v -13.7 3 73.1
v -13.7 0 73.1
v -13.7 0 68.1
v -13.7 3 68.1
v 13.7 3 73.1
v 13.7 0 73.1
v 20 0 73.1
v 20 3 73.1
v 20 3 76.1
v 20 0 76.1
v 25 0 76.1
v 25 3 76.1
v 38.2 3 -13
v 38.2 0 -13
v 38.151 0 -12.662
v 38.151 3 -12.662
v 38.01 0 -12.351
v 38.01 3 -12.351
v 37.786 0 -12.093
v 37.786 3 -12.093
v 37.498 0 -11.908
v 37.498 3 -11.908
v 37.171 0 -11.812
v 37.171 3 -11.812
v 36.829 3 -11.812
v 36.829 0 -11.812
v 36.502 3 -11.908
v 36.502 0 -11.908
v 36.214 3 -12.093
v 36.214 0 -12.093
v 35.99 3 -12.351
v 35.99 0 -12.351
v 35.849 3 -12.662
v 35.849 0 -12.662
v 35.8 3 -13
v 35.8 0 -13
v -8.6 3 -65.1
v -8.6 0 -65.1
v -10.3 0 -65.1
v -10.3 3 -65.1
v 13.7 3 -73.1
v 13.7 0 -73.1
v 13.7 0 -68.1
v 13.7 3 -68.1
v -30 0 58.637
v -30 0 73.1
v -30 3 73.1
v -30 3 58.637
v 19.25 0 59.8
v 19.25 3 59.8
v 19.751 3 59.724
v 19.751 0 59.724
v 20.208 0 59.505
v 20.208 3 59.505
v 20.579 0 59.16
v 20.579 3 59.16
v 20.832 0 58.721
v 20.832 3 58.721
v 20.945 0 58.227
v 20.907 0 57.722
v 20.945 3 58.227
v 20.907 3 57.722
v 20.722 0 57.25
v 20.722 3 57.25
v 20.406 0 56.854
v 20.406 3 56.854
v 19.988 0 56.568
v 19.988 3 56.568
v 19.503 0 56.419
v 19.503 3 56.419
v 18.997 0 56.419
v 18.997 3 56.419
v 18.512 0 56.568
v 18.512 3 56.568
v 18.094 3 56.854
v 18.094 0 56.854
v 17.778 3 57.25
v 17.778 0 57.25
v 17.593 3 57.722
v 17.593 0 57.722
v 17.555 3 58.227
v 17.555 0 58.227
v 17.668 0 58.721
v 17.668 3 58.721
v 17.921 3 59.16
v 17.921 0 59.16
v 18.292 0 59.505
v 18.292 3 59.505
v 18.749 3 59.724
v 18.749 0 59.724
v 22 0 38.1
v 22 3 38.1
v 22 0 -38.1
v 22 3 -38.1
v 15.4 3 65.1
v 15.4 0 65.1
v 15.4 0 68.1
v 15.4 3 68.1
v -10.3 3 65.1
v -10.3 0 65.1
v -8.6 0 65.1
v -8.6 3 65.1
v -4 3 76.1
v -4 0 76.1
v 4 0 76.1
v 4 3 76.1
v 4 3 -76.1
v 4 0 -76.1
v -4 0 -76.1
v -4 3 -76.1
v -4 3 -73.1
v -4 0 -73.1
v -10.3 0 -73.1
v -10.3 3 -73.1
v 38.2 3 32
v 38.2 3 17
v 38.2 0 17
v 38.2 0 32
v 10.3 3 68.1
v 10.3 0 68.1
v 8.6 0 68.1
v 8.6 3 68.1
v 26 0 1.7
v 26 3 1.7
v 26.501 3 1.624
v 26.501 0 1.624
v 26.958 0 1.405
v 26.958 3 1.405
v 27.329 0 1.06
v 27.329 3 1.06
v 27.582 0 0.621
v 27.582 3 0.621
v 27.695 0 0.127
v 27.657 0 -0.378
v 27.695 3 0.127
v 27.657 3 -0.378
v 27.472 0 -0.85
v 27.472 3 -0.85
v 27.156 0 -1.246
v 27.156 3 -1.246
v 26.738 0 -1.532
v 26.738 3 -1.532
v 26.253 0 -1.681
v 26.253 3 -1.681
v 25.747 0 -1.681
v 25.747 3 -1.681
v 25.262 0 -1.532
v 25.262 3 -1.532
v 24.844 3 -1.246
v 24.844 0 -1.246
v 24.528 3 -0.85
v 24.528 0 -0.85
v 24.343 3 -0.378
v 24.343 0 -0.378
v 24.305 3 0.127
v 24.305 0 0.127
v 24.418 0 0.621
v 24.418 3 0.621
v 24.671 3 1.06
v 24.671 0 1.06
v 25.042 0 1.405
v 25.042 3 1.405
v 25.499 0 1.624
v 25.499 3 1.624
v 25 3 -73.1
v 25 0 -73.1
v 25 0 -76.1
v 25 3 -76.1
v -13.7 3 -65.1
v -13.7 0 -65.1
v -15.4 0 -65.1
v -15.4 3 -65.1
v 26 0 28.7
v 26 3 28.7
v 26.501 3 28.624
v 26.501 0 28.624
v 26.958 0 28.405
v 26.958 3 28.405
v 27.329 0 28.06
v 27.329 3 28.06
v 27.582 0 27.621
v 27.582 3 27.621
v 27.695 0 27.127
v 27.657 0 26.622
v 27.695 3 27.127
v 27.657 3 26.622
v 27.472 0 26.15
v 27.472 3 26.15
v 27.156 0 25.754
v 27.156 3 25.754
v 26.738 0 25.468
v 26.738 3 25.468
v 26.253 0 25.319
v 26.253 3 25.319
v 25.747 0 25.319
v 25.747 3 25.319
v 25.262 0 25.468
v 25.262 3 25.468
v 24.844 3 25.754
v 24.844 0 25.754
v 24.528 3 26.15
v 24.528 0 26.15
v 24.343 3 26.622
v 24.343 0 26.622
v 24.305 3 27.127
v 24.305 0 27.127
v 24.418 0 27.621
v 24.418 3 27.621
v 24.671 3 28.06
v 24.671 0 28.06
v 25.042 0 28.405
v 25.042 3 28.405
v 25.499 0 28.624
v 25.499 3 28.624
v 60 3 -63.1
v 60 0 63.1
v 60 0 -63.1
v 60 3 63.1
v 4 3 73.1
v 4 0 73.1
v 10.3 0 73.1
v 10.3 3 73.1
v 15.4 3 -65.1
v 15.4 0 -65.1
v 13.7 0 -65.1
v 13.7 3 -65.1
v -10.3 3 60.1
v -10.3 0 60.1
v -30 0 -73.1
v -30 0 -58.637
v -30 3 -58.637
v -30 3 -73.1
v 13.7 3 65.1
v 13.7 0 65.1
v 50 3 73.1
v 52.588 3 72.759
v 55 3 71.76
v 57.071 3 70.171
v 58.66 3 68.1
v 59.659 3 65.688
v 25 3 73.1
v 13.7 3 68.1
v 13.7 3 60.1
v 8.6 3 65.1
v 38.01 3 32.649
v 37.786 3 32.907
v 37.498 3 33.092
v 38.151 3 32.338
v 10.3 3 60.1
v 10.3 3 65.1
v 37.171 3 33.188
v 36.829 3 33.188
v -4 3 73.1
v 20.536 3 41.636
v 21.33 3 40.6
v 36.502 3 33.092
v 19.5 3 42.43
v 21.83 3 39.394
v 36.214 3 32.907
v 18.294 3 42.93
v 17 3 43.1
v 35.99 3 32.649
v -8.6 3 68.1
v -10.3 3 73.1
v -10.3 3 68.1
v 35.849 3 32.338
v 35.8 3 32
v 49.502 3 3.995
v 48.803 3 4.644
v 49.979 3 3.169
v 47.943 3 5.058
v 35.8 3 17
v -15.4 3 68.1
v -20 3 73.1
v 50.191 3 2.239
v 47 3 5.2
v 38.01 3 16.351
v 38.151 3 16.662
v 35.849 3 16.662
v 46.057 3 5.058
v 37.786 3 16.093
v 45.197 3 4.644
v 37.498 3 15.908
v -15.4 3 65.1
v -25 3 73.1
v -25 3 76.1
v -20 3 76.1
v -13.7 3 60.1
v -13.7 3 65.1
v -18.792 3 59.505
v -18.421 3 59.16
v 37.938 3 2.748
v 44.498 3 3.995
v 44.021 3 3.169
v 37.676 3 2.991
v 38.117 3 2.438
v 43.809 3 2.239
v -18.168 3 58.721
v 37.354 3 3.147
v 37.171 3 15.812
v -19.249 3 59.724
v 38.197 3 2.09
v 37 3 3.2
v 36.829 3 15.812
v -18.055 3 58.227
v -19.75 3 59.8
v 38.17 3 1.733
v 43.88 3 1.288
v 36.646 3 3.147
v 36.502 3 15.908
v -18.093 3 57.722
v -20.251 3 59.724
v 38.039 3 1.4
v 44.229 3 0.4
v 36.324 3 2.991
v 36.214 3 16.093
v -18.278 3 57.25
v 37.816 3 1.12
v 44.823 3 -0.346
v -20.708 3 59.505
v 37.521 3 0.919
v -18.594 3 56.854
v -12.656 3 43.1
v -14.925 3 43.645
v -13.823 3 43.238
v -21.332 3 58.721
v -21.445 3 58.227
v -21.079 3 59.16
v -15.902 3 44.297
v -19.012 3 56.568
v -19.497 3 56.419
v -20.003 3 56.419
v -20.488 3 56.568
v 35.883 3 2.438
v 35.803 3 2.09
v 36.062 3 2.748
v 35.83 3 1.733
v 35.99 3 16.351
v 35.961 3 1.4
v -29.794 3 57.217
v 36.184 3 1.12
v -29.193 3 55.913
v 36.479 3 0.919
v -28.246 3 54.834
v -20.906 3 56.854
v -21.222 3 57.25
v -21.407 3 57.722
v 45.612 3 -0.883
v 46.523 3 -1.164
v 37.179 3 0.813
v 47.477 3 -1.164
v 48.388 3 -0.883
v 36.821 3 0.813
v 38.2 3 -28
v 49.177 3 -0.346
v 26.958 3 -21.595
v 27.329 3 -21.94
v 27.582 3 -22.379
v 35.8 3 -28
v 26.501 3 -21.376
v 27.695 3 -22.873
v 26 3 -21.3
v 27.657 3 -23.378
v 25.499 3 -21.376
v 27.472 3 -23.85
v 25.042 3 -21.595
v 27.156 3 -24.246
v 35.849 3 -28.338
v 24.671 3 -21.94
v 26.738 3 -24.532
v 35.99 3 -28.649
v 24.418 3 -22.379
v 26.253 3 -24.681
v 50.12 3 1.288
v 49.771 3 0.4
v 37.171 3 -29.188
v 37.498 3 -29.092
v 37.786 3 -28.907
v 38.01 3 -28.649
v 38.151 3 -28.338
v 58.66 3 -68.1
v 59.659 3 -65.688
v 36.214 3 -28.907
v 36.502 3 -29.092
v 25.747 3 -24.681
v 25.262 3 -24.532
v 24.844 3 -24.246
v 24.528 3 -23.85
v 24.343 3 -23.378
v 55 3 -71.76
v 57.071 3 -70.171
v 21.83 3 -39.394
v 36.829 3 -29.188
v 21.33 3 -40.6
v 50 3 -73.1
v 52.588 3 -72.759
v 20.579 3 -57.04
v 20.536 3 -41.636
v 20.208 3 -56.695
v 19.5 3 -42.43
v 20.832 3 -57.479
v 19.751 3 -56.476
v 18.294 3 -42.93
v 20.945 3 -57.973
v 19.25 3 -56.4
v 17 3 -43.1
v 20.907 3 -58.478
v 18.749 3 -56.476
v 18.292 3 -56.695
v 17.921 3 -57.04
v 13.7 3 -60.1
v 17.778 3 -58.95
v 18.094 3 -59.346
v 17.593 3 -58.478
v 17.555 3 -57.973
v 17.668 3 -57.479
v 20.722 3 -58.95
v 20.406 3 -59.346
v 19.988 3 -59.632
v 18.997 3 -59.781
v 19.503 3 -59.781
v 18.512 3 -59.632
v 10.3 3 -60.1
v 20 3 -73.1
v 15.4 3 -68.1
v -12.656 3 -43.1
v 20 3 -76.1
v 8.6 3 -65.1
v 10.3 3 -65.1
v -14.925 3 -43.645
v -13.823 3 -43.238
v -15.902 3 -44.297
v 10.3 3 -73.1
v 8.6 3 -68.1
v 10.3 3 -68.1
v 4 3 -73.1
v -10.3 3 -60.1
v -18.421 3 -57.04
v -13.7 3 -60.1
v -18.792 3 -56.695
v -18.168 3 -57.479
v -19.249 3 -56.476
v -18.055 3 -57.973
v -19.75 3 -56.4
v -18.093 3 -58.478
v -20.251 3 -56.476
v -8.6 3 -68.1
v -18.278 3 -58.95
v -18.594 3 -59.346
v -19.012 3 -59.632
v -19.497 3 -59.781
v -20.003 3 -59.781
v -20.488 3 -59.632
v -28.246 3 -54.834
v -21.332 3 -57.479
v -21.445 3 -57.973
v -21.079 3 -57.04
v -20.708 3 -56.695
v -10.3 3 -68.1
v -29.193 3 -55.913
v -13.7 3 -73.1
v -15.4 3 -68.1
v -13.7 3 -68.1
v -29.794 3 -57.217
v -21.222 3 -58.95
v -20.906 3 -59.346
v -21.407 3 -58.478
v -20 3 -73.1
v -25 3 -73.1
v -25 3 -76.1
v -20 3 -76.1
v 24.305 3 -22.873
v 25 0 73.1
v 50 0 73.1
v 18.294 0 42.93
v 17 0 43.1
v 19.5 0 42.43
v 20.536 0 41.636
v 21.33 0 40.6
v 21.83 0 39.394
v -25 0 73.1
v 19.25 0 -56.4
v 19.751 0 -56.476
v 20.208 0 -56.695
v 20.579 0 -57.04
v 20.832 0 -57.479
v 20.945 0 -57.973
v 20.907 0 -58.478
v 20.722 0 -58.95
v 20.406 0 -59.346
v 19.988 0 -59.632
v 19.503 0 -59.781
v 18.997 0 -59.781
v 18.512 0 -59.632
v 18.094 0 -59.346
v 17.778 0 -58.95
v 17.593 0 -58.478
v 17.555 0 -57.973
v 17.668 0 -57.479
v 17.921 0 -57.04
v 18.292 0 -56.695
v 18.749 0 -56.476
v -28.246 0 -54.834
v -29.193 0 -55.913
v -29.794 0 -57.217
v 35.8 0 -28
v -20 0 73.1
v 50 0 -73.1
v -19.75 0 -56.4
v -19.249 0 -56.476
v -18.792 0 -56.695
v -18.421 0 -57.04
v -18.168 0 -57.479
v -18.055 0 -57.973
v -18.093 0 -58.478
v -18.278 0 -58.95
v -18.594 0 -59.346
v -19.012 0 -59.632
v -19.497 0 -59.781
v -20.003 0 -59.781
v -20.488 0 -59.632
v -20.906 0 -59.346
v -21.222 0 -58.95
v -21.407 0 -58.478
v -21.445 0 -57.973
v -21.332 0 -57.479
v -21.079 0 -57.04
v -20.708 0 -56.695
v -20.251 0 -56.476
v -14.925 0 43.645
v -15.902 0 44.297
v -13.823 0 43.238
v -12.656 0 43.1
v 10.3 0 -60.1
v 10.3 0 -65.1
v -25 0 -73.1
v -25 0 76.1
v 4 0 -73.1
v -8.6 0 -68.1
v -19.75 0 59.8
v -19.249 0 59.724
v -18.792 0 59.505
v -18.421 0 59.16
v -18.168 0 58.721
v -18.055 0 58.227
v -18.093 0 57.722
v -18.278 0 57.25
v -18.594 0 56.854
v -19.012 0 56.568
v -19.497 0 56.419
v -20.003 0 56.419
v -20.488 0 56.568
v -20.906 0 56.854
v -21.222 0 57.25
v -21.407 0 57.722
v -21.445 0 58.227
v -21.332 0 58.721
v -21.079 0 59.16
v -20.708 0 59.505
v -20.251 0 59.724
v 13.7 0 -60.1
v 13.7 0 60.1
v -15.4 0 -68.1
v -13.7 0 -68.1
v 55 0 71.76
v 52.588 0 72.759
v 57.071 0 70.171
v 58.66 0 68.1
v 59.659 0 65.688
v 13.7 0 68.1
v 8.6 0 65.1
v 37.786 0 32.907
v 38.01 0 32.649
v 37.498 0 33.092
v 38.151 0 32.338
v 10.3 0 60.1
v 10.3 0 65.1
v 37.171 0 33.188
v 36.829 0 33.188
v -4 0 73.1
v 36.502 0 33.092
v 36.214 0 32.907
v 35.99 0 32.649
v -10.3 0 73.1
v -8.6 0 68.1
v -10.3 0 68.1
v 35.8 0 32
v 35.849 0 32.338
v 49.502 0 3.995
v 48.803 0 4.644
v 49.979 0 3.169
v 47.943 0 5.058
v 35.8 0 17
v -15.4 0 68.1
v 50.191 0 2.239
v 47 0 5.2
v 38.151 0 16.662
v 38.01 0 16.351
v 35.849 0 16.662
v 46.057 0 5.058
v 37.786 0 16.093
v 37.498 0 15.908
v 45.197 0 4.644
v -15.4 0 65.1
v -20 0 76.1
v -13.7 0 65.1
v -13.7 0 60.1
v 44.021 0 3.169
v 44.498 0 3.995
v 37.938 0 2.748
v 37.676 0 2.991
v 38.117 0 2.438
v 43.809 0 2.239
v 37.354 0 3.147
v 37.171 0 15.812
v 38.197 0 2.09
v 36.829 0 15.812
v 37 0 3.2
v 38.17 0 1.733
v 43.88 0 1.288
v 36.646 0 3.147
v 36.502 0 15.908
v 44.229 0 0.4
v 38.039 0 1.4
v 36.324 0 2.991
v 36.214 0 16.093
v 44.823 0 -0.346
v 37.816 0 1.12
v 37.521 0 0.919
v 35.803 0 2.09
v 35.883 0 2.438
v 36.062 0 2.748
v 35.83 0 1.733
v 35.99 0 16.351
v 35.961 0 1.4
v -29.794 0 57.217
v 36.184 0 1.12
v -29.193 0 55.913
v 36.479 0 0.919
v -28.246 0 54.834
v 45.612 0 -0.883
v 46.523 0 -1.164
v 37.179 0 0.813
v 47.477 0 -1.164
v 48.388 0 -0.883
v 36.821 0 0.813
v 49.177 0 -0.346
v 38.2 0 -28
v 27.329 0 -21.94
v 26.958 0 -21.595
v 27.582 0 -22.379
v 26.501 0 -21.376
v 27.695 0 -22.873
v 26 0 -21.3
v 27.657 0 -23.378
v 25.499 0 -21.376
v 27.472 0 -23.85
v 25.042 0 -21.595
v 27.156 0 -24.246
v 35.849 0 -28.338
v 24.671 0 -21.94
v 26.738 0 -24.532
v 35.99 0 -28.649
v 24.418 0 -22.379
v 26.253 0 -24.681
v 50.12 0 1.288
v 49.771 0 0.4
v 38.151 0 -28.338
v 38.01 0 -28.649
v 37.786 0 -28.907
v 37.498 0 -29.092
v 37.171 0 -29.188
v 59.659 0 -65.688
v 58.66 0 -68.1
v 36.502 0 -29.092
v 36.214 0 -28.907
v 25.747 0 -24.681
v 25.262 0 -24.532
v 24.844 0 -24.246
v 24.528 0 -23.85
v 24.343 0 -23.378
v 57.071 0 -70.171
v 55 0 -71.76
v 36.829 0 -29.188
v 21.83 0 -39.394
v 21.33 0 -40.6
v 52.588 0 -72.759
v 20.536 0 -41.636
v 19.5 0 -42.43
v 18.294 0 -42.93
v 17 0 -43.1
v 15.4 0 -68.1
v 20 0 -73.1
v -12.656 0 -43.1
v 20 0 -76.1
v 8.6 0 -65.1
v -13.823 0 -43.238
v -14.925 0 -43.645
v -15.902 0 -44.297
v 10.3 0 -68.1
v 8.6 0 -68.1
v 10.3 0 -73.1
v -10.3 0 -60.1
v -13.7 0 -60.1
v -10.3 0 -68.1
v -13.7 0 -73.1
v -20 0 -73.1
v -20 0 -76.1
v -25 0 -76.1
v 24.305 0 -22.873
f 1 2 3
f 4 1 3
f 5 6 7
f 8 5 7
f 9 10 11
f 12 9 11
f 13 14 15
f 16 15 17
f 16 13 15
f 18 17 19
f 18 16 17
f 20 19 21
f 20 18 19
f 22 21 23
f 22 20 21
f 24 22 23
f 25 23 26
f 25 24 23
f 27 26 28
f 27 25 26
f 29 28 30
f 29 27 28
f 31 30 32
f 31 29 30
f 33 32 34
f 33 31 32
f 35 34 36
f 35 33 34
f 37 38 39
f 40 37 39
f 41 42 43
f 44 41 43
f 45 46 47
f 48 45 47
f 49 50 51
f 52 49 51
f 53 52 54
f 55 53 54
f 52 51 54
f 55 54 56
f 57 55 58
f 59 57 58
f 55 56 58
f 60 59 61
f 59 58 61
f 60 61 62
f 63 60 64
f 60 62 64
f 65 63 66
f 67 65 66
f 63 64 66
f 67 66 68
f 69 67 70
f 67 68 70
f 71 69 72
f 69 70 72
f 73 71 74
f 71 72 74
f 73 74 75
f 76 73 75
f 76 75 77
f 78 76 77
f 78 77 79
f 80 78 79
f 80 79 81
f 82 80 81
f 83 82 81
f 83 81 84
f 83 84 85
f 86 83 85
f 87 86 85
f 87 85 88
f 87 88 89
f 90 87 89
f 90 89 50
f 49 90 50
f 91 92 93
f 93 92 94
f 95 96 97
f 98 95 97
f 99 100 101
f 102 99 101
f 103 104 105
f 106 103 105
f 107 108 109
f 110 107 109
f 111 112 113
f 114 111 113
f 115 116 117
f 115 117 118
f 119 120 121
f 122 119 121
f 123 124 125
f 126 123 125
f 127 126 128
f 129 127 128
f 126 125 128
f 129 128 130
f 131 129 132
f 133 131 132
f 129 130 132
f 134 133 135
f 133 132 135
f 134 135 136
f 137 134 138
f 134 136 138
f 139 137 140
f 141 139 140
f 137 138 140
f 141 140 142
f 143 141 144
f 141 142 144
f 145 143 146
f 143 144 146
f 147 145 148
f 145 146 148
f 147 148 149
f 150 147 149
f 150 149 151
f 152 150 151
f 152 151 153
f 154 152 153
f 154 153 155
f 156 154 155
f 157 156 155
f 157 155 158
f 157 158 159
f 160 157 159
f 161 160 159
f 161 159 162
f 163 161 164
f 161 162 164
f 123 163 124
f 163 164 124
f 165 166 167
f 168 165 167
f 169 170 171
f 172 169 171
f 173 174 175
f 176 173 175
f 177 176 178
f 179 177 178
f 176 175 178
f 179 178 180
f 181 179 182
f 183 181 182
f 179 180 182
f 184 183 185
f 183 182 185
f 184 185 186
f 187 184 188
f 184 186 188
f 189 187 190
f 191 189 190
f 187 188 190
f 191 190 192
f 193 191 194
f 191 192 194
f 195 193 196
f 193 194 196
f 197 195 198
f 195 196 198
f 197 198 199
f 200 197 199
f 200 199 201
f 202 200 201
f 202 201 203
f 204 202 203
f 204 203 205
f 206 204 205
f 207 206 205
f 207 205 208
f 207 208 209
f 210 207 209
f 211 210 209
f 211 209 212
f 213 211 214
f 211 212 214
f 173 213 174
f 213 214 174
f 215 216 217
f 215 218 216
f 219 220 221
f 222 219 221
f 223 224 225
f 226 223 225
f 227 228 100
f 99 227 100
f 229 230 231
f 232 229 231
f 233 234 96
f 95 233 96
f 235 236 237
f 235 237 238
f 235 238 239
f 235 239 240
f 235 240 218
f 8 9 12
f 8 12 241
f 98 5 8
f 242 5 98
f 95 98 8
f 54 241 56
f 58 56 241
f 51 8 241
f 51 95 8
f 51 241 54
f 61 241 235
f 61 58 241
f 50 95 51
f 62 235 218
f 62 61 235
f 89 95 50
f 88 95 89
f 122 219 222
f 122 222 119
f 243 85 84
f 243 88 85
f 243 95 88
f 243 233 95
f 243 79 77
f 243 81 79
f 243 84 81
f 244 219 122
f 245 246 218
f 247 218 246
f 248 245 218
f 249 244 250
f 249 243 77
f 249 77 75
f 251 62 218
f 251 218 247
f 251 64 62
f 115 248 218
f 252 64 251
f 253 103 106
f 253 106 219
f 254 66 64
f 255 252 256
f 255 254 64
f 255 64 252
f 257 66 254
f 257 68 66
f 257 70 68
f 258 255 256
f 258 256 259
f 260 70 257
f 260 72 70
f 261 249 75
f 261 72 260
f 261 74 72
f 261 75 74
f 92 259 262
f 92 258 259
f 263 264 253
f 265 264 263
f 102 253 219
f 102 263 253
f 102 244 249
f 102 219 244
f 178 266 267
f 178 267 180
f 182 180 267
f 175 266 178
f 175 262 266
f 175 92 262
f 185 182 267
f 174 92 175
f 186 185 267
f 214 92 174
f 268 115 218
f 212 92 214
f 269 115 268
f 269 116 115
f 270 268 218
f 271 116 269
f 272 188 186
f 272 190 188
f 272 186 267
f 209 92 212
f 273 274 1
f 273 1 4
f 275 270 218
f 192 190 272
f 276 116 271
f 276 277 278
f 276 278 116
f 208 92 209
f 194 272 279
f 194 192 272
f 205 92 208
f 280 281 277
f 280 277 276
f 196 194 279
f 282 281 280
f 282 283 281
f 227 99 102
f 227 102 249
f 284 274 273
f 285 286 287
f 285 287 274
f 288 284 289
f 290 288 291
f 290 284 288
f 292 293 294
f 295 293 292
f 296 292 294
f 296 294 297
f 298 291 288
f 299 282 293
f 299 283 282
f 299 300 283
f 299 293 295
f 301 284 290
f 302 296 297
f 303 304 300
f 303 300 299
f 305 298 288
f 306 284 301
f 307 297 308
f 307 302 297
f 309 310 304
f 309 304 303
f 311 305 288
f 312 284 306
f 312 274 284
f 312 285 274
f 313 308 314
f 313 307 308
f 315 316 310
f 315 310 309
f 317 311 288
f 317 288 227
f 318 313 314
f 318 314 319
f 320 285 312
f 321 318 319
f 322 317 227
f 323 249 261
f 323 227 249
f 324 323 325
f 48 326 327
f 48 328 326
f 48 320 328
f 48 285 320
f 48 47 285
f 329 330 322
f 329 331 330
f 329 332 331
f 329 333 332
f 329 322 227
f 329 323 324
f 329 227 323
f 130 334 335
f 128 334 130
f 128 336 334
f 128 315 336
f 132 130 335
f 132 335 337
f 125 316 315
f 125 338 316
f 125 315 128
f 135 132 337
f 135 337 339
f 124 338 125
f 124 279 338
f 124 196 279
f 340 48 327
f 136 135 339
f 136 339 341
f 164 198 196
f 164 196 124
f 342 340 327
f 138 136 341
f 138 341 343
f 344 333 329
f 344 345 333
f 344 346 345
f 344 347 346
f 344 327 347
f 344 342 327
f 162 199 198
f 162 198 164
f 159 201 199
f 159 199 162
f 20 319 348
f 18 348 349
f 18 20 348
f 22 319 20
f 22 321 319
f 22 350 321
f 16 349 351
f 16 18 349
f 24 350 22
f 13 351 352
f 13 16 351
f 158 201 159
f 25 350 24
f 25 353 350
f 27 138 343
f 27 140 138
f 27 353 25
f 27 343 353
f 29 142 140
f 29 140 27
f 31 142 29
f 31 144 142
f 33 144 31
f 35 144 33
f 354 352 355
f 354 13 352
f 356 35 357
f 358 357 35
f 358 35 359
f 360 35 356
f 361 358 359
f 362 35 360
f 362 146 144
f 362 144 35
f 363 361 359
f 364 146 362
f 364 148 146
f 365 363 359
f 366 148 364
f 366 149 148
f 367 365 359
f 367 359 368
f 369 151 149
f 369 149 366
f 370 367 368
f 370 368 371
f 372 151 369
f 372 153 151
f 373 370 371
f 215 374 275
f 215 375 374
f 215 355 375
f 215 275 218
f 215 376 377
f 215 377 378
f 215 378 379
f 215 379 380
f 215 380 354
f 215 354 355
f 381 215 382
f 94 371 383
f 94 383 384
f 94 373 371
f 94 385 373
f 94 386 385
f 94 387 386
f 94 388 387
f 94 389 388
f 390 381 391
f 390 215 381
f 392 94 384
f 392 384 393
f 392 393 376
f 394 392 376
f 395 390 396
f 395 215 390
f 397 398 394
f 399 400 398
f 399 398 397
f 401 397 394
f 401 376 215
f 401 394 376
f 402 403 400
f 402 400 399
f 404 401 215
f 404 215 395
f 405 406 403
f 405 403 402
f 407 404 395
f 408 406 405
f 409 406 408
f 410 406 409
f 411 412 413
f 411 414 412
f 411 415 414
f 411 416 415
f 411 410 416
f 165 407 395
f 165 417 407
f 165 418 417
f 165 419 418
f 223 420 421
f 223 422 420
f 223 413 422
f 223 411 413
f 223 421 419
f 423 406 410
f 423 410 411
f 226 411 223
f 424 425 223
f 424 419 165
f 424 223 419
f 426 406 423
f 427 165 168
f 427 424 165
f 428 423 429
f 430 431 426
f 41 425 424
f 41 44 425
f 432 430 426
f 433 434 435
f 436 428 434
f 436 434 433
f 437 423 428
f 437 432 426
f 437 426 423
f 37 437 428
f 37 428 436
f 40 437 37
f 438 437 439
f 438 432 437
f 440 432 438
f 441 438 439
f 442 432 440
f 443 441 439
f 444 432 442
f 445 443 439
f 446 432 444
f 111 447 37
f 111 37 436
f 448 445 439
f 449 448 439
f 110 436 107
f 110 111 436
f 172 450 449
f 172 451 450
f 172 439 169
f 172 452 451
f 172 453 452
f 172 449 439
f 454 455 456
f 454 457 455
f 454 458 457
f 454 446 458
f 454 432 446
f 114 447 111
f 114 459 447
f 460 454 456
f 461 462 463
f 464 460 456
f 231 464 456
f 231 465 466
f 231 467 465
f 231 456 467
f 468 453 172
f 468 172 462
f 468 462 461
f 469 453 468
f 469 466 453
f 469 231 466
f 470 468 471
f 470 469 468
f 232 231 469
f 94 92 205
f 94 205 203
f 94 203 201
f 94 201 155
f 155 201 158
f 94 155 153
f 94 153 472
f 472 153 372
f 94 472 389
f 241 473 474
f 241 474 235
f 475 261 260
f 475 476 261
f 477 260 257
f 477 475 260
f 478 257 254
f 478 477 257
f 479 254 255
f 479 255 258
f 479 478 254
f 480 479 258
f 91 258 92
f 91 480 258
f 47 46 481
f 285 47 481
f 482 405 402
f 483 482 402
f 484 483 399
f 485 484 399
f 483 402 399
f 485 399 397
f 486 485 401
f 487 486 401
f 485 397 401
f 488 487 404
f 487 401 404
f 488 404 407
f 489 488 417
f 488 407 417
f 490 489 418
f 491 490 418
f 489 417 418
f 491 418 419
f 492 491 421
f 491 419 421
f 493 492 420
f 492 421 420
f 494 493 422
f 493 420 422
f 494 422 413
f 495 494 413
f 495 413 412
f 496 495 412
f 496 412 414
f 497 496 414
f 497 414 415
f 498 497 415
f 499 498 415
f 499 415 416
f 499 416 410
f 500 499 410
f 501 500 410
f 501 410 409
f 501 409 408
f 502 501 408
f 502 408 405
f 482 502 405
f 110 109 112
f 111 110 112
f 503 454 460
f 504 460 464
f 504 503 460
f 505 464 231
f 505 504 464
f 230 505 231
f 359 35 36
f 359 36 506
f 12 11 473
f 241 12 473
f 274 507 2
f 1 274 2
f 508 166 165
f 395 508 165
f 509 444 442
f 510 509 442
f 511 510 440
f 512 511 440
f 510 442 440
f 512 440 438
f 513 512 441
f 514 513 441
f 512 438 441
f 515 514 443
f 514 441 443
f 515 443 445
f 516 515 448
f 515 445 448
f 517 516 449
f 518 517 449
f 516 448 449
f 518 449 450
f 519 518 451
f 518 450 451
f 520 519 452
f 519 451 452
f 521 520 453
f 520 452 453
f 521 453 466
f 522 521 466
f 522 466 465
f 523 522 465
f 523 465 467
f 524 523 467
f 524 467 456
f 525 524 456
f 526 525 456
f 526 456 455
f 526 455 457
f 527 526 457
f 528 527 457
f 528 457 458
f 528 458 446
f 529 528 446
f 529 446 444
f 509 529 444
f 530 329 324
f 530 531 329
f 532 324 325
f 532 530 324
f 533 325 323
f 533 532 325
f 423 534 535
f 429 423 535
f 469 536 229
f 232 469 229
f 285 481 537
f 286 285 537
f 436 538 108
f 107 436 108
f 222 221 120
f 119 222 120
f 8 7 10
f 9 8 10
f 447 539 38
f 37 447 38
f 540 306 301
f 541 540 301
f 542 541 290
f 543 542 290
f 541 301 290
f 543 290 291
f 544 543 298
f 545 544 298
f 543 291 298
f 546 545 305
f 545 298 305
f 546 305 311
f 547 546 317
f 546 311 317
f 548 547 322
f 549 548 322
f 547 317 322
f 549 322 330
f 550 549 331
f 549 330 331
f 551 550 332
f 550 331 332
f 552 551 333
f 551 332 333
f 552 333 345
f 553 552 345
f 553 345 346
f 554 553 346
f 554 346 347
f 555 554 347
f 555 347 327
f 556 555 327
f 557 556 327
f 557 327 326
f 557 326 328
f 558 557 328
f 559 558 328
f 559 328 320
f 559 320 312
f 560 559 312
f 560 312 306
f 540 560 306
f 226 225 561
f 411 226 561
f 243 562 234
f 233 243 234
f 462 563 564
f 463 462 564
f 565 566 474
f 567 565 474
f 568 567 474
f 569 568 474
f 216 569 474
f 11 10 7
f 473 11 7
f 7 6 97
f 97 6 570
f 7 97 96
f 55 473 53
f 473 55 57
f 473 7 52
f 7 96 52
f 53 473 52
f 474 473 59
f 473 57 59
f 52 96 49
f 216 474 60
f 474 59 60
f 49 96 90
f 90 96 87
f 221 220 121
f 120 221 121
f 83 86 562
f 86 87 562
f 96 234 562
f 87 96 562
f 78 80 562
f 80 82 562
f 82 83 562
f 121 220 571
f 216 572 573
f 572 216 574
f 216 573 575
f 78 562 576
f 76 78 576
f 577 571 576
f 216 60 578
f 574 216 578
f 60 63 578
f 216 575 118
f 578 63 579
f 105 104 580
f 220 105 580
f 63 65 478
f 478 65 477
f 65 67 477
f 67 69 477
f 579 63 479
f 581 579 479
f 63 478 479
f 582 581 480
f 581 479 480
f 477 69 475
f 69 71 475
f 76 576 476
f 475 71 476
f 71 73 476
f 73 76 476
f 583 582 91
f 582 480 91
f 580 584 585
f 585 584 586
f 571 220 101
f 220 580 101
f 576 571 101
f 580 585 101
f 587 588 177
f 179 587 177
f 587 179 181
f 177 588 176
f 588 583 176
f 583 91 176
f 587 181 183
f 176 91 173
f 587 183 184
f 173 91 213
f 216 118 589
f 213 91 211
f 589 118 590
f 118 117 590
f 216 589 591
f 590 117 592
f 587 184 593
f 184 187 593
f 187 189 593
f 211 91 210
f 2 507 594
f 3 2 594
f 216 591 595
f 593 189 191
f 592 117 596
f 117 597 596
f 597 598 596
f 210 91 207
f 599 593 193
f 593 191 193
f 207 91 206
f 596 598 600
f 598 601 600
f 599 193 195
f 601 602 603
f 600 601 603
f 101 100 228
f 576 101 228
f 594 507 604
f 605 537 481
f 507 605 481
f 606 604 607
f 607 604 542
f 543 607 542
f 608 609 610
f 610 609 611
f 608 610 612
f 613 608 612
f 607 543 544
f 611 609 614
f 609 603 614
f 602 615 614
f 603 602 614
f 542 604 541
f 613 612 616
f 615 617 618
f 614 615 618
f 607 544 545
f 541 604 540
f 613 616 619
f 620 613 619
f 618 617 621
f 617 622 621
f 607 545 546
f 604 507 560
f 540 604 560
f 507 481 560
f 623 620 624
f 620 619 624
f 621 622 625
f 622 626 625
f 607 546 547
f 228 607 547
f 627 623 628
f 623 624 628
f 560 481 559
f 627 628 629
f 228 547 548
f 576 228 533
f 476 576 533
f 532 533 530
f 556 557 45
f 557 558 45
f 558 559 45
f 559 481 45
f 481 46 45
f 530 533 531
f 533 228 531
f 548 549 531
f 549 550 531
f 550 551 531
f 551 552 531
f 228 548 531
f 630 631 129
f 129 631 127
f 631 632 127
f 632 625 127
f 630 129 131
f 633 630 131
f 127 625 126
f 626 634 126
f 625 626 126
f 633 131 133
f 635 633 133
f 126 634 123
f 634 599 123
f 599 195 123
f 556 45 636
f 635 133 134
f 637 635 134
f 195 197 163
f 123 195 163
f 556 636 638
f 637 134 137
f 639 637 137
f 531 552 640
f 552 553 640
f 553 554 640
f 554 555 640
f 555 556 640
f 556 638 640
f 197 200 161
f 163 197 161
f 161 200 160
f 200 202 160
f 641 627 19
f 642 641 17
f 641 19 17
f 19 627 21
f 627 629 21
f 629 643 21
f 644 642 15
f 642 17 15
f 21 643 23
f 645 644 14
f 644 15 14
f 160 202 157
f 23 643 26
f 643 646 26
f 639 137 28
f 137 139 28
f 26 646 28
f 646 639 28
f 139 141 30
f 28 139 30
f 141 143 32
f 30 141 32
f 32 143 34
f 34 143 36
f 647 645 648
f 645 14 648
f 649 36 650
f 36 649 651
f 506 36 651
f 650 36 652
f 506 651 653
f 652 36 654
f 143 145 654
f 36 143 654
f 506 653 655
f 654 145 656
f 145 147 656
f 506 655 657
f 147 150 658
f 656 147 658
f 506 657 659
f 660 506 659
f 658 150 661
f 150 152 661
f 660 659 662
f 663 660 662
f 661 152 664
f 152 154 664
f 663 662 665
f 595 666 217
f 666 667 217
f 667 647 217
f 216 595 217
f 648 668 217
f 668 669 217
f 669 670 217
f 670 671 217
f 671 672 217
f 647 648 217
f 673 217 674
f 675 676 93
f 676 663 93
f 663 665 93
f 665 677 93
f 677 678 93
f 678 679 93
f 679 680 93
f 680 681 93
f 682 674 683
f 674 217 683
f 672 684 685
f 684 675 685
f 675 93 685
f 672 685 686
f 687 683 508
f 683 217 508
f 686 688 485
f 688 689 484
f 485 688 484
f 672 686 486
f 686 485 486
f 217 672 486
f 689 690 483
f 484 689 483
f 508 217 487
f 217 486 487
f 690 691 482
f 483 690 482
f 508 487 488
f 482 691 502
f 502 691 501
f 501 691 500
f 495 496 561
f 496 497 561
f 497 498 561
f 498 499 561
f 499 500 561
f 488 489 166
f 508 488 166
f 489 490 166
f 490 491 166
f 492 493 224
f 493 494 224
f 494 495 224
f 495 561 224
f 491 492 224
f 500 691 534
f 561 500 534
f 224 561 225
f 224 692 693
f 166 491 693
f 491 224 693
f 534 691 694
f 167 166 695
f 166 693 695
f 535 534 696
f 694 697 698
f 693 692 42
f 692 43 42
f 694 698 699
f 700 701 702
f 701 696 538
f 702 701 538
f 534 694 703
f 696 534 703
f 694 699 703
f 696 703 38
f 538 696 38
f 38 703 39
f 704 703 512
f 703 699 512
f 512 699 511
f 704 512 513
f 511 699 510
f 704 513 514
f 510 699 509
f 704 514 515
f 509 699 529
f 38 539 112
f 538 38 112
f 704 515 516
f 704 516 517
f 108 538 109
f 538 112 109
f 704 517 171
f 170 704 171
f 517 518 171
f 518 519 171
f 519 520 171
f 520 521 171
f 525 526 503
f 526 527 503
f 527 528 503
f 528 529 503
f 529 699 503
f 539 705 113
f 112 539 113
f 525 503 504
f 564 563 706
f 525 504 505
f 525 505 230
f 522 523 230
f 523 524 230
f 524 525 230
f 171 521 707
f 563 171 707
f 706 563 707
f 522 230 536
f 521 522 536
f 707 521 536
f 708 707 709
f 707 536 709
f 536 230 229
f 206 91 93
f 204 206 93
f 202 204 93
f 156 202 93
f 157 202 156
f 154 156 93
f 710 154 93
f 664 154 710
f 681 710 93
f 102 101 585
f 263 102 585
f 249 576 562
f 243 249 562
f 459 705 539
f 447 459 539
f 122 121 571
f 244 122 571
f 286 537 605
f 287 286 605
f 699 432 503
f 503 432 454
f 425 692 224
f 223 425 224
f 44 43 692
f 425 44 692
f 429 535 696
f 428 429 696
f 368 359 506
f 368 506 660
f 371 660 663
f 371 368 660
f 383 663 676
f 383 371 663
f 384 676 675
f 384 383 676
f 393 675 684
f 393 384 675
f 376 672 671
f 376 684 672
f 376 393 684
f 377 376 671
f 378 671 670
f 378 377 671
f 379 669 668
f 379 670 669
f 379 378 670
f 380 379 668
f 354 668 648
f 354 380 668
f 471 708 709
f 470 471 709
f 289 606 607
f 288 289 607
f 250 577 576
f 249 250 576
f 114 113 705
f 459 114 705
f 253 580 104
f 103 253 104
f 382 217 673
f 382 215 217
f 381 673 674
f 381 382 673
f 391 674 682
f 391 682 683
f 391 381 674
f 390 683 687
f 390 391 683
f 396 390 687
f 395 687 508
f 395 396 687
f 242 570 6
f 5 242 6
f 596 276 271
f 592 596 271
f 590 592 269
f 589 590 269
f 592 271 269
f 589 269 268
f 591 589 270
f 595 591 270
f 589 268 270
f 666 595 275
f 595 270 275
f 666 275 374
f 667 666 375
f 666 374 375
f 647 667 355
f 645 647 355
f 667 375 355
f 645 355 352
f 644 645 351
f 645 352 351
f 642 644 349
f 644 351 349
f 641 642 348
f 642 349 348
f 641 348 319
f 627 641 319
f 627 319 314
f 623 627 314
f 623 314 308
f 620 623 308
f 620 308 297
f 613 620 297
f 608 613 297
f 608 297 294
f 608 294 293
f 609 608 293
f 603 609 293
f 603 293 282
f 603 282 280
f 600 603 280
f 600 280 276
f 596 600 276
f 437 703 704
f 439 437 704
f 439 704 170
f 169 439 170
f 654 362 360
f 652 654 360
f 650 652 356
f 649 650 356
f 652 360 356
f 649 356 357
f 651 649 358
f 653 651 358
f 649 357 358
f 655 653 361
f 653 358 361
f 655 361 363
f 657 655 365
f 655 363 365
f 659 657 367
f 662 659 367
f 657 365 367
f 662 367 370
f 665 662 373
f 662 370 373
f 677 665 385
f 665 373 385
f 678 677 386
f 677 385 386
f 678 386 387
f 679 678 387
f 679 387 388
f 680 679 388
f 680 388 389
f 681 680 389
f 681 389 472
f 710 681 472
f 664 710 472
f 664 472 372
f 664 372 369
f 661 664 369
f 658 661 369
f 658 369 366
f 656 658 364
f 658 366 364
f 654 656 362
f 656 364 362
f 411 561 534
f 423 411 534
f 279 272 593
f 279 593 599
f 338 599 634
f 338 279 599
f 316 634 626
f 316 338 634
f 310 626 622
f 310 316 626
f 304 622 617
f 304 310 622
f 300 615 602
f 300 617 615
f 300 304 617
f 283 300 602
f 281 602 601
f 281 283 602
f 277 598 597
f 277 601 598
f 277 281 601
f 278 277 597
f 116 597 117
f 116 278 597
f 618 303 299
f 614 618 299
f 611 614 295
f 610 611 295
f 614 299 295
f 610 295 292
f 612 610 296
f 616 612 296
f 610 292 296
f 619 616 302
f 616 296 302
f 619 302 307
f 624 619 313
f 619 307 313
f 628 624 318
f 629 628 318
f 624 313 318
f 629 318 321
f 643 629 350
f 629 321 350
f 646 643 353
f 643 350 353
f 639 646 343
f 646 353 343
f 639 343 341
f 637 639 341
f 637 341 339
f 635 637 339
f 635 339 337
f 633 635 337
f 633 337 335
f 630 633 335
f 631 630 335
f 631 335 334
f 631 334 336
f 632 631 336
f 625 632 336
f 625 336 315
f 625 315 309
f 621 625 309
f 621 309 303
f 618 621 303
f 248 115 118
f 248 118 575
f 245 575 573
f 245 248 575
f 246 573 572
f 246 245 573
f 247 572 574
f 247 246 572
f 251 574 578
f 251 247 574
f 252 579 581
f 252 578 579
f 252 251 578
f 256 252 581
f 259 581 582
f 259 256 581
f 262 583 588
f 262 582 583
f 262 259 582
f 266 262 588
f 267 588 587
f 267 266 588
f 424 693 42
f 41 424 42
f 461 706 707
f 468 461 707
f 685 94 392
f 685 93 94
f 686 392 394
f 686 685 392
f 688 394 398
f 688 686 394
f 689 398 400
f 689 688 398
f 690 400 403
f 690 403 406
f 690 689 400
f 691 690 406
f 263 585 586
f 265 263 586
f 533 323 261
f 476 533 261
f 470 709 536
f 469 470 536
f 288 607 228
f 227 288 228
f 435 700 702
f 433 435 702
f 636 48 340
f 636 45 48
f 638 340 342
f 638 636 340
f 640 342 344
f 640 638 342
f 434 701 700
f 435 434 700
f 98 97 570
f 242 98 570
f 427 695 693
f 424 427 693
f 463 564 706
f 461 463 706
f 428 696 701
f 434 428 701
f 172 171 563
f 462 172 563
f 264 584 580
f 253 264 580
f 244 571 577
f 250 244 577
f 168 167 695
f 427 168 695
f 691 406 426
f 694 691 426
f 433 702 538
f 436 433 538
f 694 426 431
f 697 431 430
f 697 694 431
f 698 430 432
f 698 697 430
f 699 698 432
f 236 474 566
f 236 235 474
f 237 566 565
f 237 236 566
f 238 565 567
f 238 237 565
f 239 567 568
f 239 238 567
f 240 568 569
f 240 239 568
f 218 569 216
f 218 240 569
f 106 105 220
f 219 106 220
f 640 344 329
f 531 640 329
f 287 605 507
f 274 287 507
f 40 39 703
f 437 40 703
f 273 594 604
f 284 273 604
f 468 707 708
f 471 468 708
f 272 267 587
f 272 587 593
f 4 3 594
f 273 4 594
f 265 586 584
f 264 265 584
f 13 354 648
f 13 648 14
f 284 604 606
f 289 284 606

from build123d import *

# Parameters (mm, degrees)
EXTRUDE_1_DEPTH     = 3
SKETCH_2_W          = 5
SKETCH_2_H          = 3
CUT_EXTRUDE_1_DEPTH = 176
SKETCH_3_W          = 146.2
SKETCH_3_H          = 3
EXTRUDE_2_DEPTH     = 5
SKETCH_4_R          = 1.7
CUT_EXTRUDE_2_DEPTH = 5
CUT_EXTRUDE_3_DEPTH = 10
FILLET_1_R          = 5
SKETCH_7_W          = 146.2
SKETCH_7_H          = 3
EXTRUDE_3_DEPTH     = 20
SKETCH_8_R          = 3.2
CUT_EXTRUDE_4_DEPTH = 20
SKETCH_9_R          = 1.2
CUT_EXTRUDE_5_DEPTH = 20
FILLET_2_R          = 10
SKETCH_10_R         = 1.7
CUT_EXTRUDE_6_DEPTH = 3


with BuildPart() as part:
    # 草图1 → 凸台-拉伸1 (new body)
    with BuildSketch(Plane(origin=(0, 0, 0), x_dir=(1, 0, 0), z_dir=(0, 1, 0))):
        Polygon((-25, -73.1), (-25, -76.1), (-20, -76.1), (-20, -73.1), (-13.7, -73.1), (-13.7, -68.1), (-15.4, -68.1), (-15.4, -65.1), (-13.7, -65.1), (-13.7, -60.1), (-10.3, -60.1), (-10.3, -65.1), (-8.6, -65.1), (-8.6, -68.1), (-10.3, -68.1), (-10.3, -73.1), (-4, -73.1), (-4, -76.1), (4, -76.1), (4, -73.1), (10.3, -73.1), (10.3, -68.1), (8.6, -68.1), (8.6, -65.1), (10.3, -65.1), (10.3, -60.1), (13.7, -60.1), (13.7, -65.1), (15.4, -65.1), (15.4, -68.1), (13.7, -68.1), (13.7, -73.1), (20, -73.1), (20, -76.1), (25, -76.1), (25, -73.1), (35, -73.1), (35, 73.1), (25, 73.1), (25, 76.1), (20, 76.1), (20, 73.1), (13.7, 73.1), (13.7, 68.1), (15.4, 68.1), (15.4, 65.1), (13.7, 65.1), (13.7, 60.1), (10.3, 60.1), (10.3, 65.1), (8.6, 65.1), (8.6, 68.1), (10.3, 68.1), (10.3, 73.1), (4, 73.1), (4, 76.1), (-4, 76.1), (-4, 73.1), (-10.3, 73.1), (-10.3, 68.1), (-8.6, 68.1), (-8.6, 65.1), (-10.3, 65.1), (-10.3, 60.1), (-13.7, 60.1), (-13.7, 65.1), (-15.4, 65.1), (-15.4, 68.1), (-13.7, 68.1), (-13.7, 73.1), (-20, 73.1), (-20, 76.1), (-25, 76.1), (-25, 73.1), (-35, 73.1), (-35, -73.1), align=None)
    extrude(amount=EXTRUDE_1_DEPTH)

    # 草图2 → 切除-拉伸1 (cut)
    with BuildSketch(Plane.XY.offset(73.1)):
        with Locations((-32.5, 1.5)):
            Rectangle(SKETCH_2_W, SKETCH_2_H)
    extrude(amount=-CUT_EXTRUDE_1_DEPTH, mode=Mode.SUBTRACT)

    # 草图3 → 凸台-拉伸2 (add)
    with BuildSketch(Plane(origin=(35, 0, 0), x_dir=(0, 0, -1), z_dir=(1, 0, 0))):
        with Locations((0, 1.5)):
            Rectangle(SKETCH_3_W, SKETCH_3_H)
    extrude(amount=EXTRUDE_2_DEPTH)

    # 草图4 → 切除-拉伸2 (cut)
    with BuildSketch(Plane(origin=(0, 3, 0), x_dir=(1, 0, 0), z_dir=(0, 1, 0))):
        with Locations(Location((-19.75, -58.1, 0), (0, 0, 270))):
            Circle(SKETCH_4_R)
        with Locations(Location((19.25, -58.1, 0), (0, 0, 270))):
            Circle(SKETCH_4_R)
        with Locations(Location((19.25, 58.1, 0), (0, 0, 270))):
            Circle(SKETCH_4_R)
        with Locations(Location((-19.75, 58.1, 0), (0, 0, 270))):
            Circle(SKETCH_4_R)
    extrude(amount=-CUT_EXTRUDE_2_DEPTH, mode=Mode.SUBTRACT)

    # 草图5 → 切除-拉伸3 (cut)
    with BuildSketch(Plane(origin=(0, 3, 0), x_dir=(1, 0, 0), z_dir=(0, 1, 0))):
        Polygon((-30, -56.331395183), (-14.5, -43.1), (0, -43.1), (22, -43.1), (22, 43.1), (-14.5, 43.1), (-30, 56.331395183), align=None)
    extrude(amount=-CUT_EXTRUDE_3_DEPTH, mode=Mode.SUBTRACT)

    # 圆角1
    fillet_1_edges = [part.edges().sort_by_distance(p)[0] for p in [
        (-30, 1.5, 56.331395183),
        (-30, 1.5, -56.331395183),
        (-14.5, 1.5, -43.1),
        (22, 1.5, -43.1),
        (22, 1.5, 43.1),
        (-14.5, 1.5, 43.1),
    ]]
    fillet(fillet_1_edges, radius=FILLET_1_R)

    # 草图7 → 凸台-拉伸3 (add)
    with BuildSketch(Plane(origin=(40, 0, 0), x_dir=(0, 0, -1), z_dir=(1, 0, 0))):
        with Locations((0, 1.5)):
            Rectangle(SKETCH_7_W, SKETCH_7_H)
    extrude(amount=EXTRUDE_3_DEPTH)

    # 草图8 → 切除-拉伸4 (cut)
    with BuildSketch(Plane(origin=(0, 3, 0), x_dir=(1, 0, 0), z_dir=(0, 1, 0))):
        with Locations(Location((47, -2, 0), (0, 0, 270))):
            Circle(SKETCH_8_R)
    extrude(amount=-CUT_EXTRUDE_4_DEPTH, mode=Mode.SUBTRACT)

    # 草图9 → 切除-拉伸5 (cut)
    with BuildSketch(Plane(origin=(0, 3, 0), x_dir=(1, 0, 0), z_dir=(0, 1, 0))):
        with Locations(Location((37, -2, 0), (0, 0, 270))):
            Circle(SKETCH_9_R)
        with BuildLine():
            Line((35.8, 13), (35.8, 28))
            ThreePointArc((35.8, 28), (37, 29.2), (38.2, 28))
            Line((38.2, 28), (38.2, 13))
            ThreePointArc((38.2, 13), (37, 11.8), (35.8, 13))
        make_face()
        with BuildLine():
            Line((38.2, -17), (38.2, -32))
            ThreePointArc((38.2, -32), (37, -33.2), (35.8, -32))
            Line((35.8, -32), (35.8, -17))
            ThreePointArc((35.8, -17), (37, -15.8), (38.2, -17))
        make_face()
    extrude(amount=-CUT_EXTRUDE_5_DEPTH, mode=Mode.SUBTRACT)

    # 圆角2
    fillet_2_edges = [part.edges().sort_by_distance(p)[0] for p in [
        (60, 1.5, 73.1),
        (60, 1.5, -73.1),
    ]]
    fillet(fillet_2_edges, radius=FILLET_2_R)

    # 草图10 → 切除-拉伸6 (cut)
    with BuildSketch(Plane(origin=(0, 3, 0), x_dir=(1, 0, 0), z_dir=(0, 1, 0))):
        with Locations(Location((26, -27, 0), (0, 0, 270))):
            Circle(SKETCH_10_R)
        with Locations(Location((26, 23, 0), (0, 0, 270))):
            Circle(SKETCH_10_R)
        with Locations(Location((26, 0, 0), (0, 0, 270))):
            Circle(SKETCH_10_R)
    extrude(amount=-CUT_EXTRUDE_6_DEPTH, mode=Mode.SUBTRACT)


solid = part.part
